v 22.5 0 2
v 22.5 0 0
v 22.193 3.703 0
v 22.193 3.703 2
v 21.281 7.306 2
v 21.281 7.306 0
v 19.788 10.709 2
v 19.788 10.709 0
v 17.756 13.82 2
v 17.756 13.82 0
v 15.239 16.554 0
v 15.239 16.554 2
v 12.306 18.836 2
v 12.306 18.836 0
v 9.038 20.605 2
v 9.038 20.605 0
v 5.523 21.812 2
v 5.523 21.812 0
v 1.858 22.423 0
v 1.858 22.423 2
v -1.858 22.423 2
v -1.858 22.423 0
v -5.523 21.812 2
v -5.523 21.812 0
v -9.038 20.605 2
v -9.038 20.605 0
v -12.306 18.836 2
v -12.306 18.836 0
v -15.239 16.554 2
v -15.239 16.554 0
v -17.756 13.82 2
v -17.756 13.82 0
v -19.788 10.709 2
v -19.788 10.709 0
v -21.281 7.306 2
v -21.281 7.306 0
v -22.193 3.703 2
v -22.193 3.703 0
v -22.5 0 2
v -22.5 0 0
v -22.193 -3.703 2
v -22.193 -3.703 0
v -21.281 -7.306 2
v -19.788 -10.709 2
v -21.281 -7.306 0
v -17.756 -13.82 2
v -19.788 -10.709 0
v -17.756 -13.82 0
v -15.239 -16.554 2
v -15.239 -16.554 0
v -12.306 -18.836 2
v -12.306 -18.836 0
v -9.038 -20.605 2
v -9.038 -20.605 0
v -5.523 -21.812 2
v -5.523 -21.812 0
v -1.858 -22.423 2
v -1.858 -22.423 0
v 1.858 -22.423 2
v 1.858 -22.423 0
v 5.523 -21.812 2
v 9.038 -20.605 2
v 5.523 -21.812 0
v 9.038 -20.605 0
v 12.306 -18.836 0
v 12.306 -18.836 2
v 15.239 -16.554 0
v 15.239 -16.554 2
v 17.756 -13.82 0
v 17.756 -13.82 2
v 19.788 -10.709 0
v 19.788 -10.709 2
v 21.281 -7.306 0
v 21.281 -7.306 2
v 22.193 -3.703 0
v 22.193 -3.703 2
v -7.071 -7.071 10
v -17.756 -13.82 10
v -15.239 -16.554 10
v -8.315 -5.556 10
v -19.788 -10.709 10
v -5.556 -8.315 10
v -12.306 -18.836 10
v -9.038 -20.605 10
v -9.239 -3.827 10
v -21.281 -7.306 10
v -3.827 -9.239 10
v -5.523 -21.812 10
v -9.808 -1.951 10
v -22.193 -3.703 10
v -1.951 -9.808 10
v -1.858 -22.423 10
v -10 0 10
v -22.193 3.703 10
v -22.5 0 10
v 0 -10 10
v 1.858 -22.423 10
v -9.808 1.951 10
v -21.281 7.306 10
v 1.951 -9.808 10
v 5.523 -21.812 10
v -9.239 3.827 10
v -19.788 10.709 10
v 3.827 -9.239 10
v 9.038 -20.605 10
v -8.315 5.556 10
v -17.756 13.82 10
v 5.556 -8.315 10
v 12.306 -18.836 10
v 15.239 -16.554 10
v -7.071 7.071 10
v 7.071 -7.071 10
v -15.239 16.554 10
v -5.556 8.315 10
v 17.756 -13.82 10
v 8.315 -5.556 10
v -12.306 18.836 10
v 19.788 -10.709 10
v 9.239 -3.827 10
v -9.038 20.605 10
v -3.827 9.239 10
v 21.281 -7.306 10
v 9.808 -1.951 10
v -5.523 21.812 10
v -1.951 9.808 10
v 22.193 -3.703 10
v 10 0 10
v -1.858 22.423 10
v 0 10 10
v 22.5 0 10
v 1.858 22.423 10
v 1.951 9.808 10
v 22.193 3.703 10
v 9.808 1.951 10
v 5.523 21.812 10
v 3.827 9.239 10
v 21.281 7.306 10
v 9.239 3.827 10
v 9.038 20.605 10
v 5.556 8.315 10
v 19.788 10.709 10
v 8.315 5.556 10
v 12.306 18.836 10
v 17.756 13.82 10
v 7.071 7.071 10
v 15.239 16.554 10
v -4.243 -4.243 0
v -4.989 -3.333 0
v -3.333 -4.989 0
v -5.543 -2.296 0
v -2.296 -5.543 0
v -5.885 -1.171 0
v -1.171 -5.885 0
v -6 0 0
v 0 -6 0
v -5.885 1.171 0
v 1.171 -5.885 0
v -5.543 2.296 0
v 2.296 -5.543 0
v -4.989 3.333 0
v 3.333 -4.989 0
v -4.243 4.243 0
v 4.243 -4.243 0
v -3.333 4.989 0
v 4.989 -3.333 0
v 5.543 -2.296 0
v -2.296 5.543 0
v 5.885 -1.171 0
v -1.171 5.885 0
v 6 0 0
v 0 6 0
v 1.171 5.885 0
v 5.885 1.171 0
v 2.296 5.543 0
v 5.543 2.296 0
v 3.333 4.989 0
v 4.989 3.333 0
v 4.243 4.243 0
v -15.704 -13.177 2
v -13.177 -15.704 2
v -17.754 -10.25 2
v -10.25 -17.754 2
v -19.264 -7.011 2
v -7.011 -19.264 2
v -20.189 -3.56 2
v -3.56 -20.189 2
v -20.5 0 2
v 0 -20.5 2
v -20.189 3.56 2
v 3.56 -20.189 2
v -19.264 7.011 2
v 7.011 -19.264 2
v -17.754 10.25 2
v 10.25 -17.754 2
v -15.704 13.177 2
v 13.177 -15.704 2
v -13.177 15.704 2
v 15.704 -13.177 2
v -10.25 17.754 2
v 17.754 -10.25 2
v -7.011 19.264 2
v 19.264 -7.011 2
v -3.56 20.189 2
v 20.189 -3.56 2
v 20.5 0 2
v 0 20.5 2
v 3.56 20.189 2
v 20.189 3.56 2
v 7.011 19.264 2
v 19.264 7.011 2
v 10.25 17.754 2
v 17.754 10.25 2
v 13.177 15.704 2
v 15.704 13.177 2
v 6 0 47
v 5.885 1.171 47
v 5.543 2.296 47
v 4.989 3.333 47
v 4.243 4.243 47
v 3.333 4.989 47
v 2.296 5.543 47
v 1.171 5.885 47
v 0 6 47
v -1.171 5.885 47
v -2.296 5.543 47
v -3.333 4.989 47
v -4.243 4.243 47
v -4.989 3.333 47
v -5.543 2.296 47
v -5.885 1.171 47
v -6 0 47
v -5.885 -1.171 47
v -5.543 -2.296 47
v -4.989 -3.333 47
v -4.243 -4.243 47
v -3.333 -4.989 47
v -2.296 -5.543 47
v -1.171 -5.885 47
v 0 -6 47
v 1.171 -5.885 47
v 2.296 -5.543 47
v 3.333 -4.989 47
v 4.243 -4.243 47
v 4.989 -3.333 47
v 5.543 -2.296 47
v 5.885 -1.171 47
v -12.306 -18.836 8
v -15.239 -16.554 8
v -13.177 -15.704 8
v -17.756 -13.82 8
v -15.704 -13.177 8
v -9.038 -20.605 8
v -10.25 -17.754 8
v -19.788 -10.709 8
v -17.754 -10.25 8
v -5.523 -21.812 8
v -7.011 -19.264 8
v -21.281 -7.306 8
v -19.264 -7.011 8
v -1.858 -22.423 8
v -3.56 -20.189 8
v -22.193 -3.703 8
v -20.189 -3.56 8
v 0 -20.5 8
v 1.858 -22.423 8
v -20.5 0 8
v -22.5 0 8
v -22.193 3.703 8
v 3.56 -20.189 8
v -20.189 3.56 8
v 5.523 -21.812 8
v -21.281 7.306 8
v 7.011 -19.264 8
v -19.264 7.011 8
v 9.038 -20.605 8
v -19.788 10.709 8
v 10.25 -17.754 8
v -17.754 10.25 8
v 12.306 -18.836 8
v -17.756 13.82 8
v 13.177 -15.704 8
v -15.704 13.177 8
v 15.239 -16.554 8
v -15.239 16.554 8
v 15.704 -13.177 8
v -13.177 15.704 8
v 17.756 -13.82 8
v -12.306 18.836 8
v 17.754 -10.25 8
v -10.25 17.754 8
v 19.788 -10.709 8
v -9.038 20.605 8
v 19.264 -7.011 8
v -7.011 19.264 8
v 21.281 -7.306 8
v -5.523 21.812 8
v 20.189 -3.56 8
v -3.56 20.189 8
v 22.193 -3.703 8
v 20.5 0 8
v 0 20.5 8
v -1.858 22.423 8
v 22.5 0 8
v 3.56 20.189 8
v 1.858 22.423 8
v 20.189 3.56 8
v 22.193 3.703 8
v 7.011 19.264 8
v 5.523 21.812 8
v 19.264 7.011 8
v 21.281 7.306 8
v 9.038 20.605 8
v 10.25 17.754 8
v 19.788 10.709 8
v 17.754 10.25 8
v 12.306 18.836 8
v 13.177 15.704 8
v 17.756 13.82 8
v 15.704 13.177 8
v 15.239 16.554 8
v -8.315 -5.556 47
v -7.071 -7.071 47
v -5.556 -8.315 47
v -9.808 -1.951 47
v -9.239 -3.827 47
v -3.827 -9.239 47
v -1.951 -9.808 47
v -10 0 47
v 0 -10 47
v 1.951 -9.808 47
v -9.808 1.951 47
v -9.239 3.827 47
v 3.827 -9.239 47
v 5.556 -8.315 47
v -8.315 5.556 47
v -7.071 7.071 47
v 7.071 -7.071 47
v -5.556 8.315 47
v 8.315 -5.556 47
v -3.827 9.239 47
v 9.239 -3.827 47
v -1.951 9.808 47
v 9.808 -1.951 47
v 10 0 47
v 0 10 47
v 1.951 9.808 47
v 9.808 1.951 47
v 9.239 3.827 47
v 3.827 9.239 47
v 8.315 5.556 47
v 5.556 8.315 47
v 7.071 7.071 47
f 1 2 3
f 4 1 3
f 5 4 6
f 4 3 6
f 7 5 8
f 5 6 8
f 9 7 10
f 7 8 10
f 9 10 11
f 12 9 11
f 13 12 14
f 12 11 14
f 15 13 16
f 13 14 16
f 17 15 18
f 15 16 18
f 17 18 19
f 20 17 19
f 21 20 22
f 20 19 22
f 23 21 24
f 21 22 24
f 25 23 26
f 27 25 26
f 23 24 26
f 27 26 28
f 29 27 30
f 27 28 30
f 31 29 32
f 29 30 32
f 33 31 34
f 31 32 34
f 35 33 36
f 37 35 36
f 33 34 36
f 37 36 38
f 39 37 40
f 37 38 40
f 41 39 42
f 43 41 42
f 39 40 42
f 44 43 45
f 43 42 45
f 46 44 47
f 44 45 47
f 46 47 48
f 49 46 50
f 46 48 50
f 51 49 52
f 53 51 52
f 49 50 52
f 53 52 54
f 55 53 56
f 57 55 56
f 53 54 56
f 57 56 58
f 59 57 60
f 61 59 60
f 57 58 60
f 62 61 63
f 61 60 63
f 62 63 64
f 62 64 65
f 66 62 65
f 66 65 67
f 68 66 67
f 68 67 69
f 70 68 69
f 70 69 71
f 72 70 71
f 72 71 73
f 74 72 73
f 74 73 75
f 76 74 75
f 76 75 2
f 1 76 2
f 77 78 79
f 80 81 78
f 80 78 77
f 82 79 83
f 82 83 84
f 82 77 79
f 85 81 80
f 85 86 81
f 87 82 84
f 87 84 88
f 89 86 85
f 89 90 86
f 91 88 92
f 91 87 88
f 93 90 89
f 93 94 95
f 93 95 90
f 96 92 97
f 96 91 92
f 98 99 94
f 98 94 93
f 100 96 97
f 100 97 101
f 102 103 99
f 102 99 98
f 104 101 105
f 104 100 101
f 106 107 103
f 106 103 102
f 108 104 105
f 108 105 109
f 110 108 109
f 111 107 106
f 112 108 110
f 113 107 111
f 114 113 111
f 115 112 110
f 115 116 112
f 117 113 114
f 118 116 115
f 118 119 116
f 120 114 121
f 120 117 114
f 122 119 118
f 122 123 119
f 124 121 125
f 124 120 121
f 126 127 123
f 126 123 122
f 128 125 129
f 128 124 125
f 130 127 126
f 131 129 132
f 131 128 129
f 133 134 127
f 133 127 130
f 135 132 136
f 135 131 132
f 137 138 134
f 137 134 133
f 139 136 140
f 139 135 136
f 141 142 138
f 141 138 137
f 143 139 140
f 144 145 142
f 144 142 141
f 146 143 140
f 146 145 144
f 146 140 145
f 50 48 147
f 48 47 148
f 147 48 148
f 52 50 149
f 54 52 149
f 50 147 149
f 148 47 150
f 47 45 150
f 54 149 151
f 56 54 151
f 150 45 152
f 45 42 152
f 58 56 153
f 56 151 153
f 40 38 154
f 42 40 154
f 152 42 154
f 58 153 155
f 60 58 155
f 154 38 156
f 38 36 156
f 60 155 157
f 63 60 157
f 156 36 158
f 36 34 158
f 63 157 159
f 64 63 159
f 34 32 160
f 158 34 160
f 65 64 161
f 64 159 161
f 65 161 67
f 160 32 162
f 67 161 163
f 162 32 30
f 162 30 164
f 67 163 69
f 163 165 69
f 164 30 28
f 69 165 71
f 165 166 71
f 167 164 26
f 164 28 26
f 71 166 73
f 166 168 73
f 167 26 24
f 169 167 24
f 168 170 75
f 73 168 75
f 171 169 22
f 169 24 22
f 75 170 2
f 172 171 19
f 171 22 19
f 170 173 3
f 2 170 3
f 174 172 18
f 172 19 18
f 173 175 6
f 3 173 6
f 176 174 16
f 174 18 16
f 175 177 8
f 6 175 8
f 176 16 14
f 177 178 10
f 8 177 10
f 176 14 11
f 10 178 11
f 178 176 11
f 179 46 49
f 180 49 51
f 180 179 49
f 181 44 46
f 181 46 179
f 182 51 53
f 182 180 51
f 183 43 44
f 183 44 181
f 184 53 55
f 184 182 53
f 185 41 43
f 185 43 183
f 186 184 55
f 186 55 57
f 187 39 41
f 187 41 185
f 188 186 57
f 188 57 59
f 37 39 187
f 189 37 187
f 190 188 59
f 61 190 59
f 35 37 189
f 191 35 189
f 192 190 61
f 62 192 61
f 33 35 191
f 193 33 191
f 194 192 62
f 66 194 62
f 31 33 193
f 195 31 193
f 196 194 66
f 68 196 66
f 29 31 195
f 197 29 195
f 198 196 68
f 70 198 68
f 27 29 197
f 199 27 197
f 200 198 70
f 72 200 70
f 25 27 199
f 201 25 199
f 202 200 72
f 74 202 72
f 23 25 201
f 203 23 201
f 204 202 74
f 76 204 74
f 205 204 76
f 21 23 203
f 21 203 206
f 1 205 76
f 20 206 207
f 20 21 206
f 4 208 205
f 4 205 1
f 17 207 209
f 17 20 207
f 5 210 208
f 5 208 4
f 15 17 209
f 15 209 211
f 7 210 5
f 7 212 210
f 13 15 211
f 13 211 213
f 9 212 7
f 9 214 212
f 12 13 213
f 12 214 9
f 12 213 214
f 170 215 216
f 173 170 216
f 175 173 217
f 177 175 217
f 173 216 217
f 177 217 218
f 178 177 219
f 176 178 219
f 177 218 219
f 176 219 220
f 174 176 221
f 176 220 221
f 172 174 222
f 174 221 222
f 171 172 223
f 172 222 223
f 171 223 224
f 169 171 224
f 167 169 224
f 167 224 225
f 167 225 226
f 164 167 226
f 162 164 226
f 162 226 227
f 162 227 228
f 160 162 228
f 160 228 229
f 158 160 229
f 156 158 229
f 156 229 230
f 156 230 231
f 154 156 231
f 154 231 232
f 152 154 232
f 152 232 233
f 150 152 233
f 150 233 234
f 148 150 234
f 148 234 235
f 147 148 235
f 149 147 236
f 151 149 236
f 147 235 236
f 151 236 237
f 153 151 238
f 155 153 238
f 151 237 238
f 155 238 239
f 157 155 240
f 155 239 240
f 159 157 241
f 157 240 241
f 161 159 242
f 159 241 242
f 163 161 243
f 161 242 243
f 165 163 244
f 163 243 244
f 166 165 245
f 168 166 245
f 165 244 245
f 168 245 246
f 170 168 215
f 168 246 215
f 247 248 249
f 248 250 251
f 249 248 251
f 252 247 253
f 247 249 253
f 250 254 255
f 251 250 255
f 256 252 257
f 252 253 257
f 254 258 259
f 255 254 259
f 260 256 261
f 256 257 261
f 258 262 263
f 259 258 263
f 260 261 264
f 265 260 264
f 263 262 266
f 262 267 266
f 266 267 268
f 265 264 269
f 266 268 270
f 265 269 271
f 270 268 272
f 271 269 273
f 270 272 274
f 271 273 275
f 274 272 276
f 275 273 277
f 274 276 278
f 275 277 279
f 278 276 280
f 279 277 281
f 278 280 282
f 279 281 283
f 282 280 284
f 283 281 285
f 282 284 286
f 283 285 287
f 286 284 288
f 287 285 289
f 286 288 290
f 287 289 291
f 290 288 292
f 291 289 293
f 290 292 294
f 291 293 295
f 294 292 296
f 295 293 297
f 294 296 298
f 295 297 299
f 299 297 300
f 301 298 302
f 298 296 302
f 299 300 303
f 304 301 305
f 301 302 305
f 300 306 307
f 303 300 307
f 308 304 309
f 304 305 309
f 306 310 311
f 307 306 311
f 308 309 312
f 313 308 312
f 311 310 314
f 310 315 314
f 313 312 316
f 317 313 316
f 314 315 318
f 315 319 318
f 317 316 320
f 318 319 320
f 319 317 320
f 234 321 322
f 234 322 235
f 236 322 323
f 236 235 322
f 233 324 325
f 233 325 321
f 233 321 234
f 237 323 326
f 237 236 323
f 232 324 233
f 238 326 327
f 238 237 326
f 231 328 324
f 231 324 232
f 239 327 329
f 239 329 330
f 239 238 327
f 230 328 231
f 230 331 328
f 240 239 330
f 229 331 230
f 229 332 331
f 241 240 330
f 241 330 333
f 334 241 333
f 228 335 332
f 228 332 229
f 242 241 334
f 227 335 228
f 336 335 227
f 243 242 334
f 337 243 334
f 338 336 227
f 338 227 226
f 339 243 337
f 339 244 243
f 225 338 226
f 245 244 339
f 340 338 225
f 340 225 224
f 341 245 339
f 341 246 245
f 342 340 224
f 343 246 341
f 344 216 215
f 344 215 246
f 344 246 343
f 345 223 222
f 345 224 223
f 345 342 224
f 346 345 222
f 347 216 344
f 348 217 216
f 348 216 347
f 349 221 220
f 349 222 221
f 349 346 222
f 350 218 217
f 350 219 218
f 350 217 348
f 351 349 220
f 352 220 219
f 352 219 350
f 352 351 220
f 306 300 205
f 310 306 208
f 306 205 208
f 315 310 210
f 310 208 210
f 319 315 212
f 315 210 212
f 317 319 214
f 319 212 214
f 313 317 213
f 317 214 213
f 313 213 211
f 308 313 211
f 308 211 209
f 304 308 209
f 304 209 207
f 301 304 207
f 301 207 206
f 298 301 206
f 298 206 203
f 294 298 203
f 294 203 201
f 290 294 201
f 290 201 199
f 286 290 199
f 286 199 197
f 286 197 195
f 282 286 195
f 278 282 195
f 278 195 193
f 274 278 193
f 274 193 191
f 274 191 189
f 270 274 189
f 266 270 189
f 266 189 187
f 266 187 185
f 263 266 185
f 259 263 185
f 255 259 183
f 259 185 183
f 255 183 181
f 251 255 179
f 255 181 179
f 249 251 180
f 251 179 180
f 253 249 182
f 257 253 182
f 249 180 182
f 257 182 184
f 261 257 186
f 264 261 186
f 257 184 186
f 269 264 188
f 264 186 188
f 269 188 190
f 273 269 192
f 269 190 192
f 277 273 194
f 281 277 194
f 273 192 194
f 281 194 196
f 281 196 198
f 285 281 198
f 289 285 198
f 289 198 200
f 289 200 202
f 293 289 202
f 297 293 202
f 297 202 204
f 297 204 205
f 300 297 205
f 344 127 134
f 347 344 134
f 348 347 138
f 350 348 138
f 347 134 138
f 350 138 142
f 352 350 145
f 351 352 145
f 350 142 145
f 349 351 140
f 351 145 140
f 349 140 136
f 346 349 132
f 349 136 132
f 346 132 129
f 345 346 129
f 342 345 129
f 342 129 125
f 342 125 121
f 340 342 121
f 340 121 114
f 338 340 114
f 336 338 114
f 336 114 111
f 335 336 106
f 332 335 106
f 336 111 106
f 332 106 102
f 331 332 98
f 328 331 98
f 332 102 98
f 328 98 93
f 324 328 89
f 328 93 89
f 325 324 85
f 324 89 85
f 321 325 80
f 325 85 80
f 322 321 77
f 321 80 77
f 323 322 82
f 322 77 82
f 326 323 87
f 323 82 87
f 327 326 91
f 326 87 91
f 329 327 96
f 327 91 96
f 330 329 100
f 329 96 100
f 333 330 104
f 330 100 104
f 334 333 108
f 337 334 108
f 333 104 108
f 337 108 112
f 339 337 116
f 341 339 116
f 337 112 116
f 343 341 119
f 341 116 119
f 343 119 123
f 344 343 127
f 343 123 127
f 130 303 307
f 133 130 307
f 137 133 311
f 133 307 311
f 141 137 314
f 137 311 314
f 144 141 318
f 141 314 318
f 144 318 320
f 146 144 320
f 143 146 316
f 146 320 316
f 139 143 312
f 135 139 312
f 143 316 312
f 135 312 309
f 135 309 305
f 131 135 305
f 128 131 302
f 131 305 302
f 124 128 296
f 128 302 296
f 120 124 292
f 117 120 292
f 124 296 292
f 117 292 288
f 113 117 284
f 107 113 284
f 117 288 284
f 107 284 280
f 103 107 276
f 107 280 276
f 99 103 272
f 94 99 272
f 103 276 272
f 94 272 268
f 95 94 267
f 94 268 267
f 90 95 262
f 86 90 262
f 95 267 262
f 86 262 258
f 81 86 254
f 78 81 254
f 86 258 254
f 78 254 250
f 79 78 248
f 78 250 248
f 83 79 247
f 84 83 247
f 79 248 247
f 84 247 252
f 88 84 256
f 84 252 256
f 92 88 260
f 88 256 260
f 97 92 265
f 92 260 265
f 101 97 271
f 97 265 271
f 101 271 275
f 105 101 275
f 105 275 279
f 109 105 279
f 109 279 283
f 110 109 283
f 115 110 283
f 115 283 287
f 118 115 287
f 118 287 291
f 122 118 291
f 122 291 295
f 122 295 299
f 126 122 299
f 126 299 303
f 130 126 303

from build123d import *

# Parameters (mm, degrees)
SKIZZE1_R                        = 22.5
SEITE1_DEPTH                     = 2
SKIZZE2_R                        = 20.5
LAUFFL_CHE_DEPTH                 = 8
SKIZZE5_R                        = 22.5
SEITE_2_DEPTH                    = 2
BOHRUNG_DEPTH                    = 100
BOHRUNG_DEPTH_BACK               = 34.35416016
SKIZZE7_R                        = 2.5
SKIZZE9_R                        = 10
ZAPFEN_DEPTH                     = 37
F_12_0_12_DURCHMESSER_BOHRUNG1_D = 12


with BuildPart() as part:
    # Skizze1 → Seite1 (new body)
    with BuildSketch(Plane.XY):
        Circle(SKIZZE1_R)
    extrude(amount=SEITE1_DEPTH)

    # Skizze2 → Lauffläche (add)
    with BuildSketch(Plane.XY):
        Circle(SKIZZE2_R)
    extrude(amount=LAUFFL_CHE_DEPTH)

    # Skizze5 → Seite 2 (add)
    with BuildSketch(Plane.XY.offset(8)):
        Circle(SKIZZE5_R)
    extrude(amount=SEITE_2_DEPTH)

    # Skizze7 → Bohrung (cut, two sides: drawn at the far end of the back side and taken through both)
    with BuildSketch(Plane.XY.offset(-BOHRUNG_DEPTH_BACK)):
        Circle(SKIZZE7_R)
    extrude(amount=BOHRUNG_DEPTH + BOHRUNG_DEPTH_BACK, mode=Mode.SUBTRACT)

    # Skizze9 → Zapfen (add)
    with BuildSketch(Plane.XY.offset(10)):
        Circle(SKIZZE9_R)
    extrude(amount=ZAPFEN_DEPTH)

    # Ø12.0 (12) Durchmesser Bohrung1 (through all)
    with Locations(Plane(origin=(0, 0, 0), x_dir=(-1, 0, 0), z_dir=(0, 0, -1))):
        with Locations((0, 0)):
            Hole(F_12_0_12_DURCHMESSER_BOHRUNG1_D / 2)


solid = part.part
